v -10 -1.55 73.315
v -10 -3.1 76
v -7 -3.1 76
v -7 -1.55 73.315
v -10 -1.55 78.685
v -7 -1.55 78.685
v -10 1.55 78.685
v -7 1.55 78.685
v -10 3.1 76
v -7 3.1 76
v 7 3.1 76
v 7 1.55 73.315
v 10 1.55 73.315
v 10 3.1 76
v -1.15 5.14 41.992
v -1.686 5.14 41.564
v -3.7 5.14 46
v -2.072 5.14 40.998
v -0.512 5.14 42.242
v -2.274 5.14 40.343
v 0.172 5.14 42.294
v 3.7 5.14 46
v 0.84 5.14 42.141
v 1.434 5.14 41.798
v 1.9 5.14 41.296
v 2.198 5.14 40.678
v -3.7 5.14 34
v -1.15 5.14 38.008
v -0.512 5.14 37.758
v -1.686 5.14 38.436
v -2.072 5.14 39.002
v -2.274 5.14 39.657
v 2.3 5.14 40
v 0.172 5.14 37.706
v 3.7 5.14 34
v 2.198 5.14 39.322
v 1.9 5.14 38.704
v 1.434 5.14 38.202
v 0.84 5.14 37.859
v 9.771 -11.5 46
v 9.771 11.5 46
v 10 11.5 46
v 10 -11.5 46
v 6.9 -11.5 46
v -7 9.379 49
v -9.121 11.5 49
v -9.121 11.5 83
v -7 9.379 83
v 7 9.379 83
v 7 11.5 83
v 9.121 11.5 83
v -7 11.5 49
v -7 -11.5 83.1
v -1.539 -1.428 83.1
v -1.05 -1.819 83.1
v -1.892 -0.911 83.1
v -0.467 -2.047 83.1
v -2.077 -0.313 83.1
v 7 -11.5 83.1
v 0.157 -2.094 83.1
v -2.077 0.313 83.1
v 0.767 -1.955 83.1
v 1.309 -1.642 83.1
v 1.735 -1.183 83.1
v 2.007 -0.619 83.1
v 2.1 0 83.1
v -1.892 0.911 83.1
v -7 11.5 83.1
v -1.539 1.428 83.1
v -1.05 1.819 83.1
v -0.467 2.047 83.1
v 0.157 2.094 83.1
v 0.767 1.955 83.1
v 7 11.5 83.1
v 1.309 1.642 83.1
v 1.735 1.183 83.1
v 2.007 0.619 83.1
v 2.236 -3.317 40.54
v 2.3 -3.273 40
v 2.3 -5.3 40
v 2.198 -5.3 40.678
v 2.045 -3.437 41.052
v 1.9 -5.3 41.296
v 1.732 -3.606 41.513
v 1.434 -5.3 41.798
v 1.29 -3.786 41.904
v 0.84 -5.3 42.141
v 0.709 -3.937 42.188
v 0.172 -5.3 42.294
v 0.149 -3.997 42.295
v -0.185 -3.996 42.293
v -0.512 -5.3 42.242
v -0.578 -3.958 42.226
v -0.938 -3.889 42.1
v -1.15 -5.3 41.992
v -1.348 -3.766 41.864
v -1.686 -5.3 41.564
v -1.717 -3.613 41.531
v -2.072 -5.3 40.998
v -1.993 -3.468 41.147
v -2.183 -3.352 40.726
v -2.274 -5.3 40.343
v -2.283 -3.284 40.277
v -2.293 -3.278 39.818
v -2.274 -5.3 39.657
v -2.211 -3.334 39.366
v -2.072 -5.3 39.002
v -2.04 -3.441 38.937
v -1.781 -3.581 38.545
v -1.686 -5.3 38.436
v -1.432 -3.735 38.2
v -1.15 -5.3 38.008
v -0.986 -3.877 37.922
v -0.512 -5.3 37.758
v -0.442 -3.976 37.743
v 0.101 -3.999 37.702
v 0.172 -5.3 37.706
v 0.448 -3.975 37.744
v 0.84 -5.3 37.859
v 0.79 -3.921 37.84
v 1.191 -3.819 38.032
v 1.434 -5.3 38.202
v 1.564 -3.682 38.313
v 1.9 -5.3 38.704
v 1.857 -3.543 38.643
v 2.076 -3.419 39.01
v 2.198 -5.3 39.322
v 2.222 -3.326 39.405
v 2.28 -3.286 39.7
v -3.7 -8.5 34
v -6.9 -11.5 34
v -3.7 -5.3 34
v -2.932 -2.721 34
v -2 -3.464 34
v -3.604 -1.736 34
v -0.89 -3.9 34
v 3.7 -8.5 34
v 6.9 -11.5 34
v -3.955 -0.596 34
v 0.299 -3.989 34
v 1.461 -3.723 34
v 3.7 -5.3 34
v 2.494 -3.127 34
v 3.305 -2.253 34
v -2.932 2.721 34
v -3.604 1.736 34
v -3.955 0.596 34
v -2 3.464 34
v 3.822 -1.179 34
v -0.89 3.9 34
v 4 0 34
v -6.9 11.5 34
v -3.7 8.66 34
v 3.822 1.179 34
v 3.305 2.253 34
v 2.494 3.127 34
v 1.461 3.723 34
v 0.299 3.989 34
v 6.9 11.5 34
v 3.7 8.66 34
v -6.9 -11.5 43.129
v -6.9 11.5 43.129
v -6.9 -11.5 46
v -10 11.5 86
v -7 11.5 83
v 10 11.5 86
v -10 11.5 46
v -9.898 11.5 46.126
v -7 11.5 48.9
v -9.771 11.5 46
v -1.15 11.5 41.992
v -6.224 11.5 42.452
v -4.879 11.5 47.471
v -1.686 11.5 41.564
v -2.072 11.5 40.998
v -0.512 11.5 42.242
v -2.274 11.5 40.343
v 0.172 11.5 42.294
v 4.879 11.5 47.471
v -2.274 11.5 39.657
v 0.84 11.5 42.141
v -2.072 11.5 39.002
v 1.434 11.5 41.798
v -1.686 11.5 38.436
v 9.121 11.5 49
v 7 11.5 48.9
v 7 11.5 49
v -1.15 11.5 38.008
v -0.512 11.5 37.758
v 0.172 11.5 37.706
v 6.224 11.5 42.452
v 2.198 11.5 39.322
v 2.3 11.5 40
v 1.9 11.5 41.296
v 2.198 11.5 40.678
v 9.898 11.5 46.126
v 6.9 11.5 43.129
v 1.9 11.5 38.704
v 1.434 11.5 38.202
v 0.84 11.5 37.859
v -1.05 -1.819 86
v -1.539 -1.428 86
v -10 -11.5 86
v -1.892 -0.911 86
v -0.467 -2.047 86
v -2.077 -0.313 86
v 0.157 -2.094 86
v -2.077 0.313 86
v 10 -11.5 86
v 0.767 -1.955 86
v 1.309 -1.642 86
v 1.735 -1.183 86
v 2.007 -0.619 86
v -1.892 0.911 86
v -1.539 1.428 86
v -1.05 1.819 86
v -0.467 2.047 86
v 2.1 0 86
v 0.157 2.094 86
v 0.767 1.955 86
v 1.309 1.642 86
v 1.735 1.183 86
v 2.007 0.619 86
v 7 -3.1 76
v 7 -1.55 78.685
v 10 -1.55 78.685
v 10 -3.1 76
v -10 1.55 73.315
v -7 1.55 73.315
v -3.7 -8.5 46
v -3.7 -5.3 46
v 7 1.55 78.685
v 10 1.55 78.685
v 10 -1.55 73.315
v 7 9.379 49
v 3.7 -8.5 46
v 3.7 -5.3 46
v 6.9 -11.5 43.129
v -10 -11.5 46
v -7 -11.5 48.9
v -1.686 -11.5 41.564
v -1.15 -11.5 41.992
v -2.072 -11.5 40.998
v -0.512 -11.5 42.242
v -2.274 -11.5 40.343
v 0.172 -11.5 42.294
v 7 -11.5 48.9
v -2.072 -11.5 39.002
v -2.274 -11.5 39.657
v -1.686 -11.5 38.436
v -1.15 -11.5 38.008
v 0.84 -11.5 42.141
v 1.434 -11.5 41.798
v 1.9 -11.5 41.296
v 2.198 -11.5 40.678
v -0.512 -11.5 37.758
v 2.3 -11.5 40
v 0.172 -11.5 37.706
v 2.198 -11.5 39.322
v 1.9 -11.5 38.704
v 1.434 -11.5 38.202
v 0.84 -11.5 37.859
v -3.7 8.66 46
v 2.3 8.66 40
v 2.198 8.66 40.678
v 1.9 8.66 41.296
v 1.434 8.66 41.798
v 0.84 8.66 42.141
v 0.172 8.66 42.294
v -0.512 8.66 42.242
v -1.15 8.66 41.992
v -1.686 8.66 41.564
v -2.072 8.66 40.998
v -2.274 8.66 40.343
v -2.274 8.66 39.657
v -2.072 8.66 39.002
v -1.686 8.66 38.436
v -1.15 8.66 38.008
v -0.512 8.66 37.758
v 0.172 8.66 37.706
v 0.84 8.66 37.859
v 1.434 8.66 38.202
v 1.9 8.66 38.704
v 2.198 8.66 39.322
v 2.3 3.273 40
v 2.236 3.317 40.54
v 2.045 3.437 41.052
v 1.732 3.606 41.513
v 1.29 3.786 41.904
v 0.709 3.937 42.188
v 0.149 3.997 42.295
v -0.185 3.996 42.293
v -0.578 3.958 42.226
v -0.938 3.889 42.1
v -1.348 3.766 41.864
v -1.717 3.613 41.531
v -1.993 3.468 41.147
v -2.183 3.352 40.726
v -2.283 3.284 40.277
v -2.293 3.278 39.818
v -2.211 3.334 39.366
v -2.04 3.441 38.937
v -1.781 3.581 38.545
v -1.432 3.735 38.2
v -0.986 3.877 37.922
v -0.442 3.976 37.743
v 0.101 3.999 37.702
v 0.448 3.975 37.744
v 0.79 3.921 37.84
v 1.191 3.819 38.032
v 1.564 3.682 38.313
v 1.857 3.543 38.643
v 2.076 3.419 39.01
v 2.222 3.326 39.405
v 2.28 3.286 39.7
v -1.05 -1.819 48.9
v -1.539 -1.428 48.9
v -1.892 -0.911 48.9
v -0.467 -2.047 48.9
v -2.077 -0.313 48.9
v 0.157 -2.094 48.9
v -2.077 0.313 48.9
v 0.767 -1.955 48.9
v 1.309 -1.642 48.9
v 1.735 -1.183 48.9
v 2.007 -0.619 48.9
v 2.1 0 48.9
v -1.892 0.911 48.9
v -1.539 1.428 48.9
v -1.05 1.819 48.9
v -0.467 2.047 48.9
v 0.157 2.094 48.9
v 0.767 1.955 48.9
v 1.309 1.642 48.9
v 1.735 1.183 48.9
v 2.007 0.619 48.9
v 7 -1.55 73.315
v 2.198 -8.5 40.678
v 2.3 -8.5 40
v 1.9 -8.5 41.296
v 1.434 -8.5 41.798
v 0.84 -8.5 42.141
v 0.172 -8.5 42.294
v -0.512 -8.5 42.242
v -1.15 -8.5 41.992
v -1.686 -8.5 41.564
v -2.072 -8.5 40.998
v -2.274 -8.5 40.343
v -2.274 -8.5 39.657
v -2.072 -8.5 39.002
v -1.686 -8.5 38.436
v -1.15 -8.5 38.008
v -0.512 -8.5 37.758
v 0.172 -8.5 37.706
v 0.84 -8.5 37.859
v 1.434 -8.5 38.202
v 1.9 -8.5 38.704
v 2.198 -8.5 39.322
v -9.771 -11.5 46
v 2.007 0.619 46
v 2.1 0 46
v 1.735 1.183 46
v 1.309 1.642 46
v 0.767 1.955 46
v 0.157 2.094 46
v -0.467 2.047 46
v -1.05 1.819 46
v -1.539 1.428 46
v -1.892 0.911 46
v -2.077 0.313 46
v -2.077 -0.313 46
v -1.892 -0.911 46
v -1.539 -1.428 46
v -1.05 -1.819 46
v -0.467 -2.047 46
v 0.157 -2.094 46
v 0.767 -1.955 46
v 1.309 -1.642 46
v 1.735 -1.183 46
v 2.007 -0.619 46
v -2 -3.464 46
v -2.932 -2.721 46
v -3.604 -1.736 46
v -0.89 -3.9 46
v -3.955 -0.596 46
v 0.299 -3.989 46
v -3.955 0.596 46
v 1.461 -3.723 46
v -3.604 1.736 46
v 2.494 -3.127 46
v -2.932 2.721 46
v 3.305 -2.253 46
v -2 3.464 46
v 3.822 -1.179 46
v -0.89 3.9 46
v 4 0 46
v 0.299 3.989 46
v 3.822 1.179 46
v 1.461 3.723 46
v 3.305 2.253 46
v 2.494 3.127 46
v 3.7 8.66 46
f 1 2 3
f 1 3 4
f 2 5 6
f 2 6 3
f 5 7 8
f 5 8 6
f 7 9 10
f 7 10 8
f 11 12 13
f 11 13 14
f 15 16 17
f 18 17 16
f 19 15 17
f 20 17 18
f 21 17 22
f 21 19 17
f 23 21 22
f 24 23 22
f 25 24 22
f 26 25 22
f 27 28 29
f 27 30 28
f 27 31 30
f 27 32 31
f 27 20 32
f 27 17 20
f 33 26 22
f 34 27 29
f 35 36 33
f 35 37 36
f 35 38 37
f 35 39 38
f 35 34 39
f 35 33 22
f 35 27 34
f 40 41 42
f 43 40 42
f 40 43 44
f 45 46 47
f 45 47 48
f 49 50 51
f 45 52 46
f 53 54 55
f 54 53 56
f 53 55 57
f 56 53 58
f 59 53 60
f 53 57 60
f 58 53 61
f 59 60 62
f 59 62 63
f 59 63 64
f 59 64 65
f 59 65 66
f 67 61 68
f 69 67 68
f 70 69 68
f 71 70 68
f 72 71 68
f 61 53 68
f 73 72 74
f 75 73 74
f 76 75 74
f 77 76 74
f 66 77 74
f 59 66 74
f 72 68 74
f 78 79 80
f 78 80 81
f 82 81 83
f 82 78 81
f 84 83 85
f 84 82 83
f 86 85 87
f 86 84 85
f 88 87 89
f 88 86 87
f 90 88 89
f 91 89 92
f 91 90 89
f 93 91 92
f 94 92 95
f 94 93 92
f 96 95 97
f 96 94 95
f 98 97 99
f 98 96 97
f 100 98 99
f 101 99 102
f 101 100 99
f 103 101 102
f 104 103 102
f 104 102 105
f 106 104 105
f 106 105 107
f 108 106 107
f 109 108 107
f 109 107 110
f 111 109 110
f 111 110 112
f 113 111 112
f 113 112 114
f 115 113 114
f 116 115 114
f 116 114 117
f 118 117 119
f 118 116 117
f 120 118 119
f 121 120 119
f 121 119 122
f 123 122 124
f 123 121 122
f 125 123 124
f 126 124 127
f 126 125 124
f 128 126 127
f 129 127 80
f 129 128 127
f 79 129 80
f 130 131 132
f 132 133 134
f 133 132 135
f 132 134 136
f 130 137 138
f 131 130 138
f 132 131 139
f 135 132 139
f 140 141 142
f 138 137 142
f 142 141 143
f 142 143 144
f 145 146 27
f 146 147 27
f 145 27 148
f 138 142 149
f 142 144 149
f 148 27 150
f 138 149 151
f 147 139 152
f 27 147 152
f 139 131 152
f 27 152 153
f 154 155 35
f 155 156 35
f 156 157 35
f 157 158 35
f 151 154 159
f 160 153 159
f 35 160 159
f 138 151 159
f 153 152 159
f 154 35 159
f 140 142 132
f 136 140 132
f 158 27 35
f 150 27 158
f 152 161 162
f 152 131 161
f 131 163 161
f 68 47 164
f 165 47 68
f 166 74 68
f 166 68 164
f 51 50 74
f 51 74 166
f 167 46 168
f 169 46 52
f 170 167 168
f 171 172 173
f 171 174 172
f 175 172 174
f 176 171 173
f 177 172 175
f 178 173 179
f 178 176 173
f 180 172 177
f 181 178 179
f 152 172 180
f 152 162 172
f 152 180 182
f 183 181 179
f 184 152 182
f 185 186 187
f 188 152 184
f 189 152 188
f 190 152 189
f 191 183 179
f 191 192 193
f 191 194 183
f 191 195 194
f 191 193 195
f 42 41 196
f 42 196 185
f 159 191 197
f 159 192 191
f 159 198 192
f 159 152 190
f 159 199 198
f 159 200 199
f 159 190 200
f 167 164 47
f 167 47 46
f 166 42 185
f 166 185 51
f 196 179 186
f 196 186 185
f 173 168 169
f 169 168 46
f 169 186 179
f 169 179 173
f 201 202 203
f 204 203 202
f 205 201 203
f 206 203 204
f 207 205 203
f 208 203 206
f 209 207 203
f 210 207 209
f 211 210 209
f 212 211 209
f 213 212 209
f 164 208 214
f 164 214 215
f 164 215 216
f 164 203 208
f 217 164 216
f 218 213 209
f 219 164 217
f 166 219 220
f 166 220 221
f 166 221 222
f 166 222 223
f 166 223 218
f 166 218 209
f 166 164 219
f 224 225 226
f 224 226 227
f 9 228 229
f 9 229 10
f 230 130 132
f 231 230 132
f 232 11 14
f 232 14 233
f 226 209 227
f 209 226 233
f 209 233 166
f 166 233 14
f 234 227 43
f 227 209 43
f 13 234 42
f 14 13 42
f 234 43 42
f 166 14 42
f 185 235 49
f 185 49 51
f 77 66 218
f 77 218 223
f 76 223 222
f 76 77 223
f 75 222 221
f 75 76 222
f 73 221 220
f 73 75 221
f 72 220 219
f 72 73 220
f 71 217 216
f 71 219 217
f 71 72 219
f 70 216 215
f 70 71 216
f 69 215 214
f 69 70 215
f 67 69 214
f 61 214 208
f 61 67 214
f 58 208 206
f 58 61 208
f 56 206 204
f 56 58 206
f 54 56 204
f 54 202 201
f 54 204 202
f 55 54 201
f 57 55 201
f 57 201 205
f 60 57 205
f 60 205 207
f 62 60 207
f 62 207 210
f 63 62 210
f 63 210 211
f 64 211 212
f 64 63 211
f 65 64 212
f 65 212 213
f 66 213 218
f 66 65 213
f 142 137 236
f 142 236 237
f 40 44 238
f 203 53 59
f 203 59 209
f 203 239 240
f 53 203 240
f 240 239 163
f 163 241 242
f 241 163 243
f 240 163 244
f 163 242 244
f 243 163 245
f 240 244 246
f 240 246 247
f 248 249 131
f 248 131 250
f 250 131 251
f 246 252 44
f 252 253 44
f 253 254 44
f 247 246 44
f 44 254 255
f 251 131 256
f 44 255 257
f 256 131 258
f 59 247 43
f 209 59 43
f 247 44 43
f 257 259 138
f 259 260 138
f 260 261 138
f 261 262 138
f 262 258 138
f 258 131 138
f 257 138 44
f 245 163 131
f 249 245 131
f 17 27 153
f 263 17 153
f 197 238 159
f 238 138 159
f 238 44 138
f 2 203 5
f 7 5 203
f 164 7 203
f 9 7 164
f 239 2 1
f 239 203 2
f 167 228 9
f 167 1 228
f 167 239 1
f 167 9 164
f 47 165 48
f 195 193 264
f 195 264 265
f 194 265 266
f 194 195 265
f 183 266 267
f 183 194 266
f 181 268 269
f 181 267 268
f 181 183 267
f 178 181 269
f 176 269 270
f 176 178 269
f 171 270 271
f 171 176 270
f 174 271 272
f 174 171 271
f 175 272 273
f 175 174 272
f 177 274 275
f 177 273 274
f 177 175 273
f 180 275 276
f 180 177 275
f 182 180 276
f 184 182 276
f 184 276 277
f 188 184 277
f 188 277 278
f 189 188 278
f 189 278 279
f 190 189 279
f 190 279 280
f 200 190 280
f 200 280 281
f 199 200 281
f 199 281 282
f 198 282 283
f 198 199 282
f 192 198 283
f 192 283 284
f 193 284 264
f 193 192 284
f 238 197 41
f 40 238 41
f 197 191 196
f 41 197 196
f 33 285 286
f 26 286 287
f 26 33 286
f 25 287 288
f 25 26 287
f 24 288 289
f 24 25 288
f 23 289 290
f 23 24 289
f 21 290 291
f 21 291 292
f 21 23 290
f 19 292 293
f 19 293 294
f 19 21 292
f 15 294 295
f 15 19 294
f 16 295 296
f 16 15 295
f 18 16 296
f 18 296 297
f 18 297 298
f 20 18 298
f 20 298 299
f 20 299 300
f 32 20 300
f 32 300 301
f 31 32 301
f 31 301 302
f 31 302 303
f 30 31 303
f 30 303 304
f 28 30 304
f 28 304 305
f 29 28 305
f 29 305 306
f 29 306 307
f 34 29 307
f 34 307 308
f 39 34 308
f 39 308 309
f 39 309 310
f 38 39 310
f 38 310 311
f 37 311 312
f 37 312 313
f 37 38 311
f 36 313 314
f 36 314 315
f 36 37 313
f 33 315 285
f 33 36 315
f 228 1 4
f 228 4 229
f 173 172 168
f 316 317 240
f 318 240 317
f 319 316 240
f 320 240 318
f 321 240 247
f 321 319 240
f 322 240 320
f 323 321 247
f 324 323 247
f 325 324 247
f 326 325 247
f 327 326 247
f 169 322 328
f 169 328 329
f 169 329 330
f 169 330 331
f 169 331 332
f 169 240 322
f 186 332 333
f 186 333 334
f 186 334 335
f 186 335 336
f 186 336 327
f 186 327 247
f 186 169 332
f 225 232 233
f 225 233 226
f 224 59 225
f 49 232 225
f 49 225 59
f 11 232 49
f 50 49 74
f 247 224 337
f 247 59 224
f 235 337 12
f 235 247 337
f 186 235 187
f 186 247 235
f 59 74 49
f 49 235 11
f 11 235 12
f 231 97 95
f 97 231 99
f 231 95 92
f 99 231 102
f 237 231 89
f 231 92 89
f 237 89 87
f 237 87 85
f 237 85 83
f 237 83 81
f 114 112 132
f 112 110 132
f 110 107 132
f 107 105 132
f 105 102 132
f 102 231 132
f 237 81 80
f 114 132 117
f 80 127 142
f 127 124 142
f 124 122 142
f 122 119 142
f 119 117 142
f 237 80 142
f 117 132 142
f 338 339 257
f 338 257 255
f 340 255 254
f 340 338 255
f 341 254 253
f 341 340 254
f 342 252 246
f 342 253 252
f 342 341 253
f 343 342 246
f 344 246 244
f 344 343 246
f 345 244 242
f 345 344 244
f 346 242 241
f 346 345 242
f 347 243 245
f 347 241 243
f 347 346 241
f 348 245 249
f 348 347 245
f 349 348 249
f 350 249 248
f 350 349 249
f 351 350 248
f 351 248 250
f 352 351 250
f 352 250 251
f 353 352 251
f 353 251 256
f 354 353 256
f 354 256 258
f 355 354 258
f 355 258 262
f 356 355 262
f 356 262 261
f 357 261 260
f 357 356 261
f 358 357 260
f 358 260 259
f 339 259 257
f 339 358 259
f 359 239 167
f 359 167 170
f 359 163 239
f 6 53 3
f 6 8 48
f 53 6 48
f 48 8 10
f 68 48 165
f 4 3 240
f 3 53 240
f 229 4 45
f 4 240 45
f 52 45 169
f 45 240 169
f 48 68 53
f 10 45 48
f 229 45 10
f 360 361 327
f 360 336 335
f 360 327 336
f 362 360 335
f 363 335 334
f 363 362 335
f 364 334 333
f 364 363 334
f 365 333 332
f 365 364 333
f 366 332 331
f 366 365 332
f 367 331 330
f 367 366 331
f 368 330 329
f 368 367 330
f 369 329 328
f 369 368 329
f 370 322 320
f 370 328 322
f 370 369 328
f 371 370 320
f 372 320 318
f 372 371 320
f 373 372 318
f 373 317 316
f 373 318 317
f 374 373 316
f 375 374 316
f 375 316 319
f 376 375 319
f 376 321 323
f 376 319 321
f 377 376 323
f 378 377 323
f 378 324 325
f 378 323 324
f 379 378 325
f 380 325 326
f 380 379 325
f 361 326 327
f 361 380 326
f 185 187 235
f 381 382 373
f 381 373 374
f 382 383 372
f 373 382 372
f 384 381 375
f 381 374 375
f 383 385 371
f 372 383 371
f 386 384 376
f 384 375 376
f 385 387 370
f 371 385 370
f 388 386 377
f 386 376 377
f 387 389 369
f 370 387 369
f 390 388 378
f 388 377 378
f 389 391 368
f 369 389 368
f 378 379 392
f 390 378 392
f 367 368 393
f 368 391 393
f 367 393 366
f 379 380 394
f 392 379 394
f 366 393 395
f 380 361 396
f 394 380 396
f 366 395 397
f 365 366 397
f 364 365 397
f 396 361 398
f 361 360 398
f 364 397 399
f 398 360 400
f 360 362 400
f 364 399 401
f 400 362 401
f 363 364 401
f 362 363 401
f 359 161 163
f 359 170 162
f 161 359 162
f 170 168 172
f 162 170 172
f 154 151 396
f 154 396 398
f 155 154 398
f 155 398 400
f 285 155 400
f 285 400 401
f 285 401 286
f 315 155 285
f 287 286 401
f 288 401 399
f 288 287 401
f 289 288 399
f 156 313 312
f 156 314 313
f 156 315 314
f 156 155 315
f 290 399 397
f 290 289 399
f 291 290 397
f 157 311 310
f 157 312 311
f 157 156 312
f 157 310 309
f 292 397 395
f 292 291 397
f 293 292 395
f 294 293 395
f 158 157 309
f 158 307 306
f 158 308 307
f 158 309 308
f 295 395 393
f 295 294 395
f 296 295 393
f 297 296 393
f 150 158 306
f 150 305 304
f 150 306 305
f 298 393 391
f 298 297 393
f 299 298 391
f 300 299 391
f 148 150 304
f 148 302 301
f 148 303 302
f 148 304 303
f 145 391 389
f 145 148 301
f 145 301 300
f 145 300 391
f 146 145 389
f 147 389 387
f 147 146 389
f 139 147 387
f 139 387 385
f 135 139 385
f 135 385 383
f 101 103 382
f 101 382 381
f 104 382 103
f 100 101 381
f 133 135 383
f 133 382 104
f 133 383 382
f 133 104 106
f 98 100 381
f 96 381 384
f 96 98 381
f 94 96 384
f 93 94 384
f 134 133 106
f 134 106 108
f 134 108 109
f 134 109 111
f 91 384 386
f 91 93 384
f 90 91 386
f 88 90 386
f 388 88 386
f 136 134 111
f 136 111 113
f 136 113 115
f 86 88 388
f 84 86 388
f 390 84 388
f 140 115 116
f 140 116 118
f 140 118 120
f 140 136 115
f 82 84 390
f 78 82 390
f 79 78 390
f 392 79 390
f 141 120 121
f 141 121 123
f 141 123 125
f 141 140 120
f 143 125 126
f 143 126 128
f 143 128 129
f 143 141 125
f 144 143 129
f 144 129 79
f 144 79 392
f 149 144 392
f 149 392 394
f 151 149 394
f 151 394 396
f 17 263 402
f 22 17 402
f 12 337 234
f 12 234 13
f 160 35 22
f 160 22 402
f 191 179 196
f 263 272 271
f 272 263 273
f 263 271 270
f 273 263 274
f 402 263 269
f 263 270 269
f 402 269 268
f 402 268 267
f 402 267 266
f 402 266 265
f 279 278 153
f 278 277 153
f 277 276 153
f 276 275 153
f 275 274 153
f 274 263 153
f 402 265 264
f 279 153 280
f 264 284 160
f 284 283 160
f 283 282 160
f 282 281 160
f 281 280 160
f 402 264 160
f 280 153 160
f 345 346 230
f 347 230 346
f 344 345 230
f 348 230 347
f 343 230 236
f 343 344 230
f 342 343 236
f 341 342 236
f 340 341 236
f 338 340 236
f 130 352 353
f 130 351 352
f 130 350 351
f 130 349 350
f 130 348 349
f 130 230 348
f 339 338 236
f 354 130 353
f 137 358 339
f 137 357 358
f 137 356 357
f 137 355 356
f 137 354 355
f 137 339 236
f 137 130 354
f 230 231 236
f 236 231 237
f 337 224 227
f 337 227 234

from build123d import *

# Parameters (mm, degrees)
CYLINDER010_R            = 2.1
CYLINDER010_DEPTH        = 43
CYLINDER011_R            = 4
CYLINDER011_DEPTH        = 12
CYLINDER012_R            = 2.3
CYLINDER012_DEPTH        = 71
CUBE018_W                = 7.4
CUBE018_H                = 3.2
CUBE018_DEPTH            = 12
CUBE019_W                = 7.4
CUBE019_H                = 3.52
CUBE019_DEPTH            = 12
PRISM011_DEPTH           = 34
PRISM011_PLACEMENT_ANGLE = 15
PRISM012_DEPTH           = 34
PRISM012_PLACEMENT_ANGLE = 75
PRISM013_DEPTH           = 21
CUBE017_W                = 14
CUBE017_H                = 23
CUBE017_DEPTH            = 34.2
CUBE016_W                = 13.8
CUBE016_H                = 23
CUBE016_DEPTH            = 12
PRISM009_DEPTH           = 23
PRISM009_ROLL_ANGLE      = 90
PRISM009_PITCH_ANGLE     = -14.999996
PRISM010_DEPTH           = 23
PRISM010_ROLL_ANGLE      = -90
PRISM010_PITCH_ANGLE     = -14.999996
PRISM010_PLACEMENT_ANGLE = -180
CUBE015_W                = 20
CUBE015_H                = 23
CUBE015_DEPTH            = 40


with BuildPart() as cylinder010:
    # cylinder010 → cylinder010 (new body)
    with BuildSketch(Plane.XY.offset(44.5)):
        Circle(CYLINDER010_R)
    extrude(amount=CYLINDER010_DEPTH)


with BuildPart() as cylinder011:
    # cylinder011 → cylinder011 (new body)
    with BuildSketch(Plane.XY.offset(34)):
        Circle(CYLINDER011_R)
    extrude(amount=CYLINDER011_DEPTH)


with BuildPart() as cylinder012:
    # cylinder012 → cylinder012 (new body)
    with BuildSketch(Plane(origin=(0, 35.5, 40), x_dir=(1, 0, 0), z_dir=(0, -1, 0))):
        Circle(CYLINDER012_R)
    extrude(amount=CYLINDER012_DEPTH)


with BuildPart() as cube018:
    # cube018 → cube018 (new body)
    with BuildSketch(Plane(origin=(-3.7, -8.5, 34), x_dir=(1, 0, 0), z_dir=(0, 0, 1))):
        with Locations((3.7, 1.6)):
            Rectangle(CUBE018_W, CUBE018_H)
    extrude(amount=CUBE018_DEPTH)


with BuildPart() as cube019:
    # cube019 → cube019 (new body)
    with BuildSketch(Plane(origin=(-3.7, 5.14, 34), x_dir=(1, 0, 0), z_dir=(0, 0, 1))):
        with Locations((3.7, 1.76)):
            Rectangle(CUBE019_W, CUBE019_H)
    extrude(amount=CUBE019_DEPTH)


with BuildPart() as prism011:
    # prism011 → prism011 (new body)
    with BuildSketch(Plane.XY):
        Polygon((3, 0), (-1.5, 2.598076), (-1.5, -2.598076), align=None)
    extrude(amount=PRISM011_DEPTH)


with BuildPart() as prism011_1:
    # prism011 placement: moved
    add(prism011.part.moved(Location((7, 11.5, 49))).rotate(Axis((7, 11.5, 49), (0, 0, 1)), PRISM011_PLACEMENT_ANGLE))


with BuildPart() as prism012:
    # prism012 → prism012 (new body)
    with BuildSketch(Plane.XY):
        Polygon((3, 0), (-1.5, 2.598076), (-1.5, -2.598076), align=None)
    extrude(amount=PRISM012_DEPTH)


with BuildPart() as prism012_1:
    # prism012 placement: moved
    add(prism012.part.moved(Location((-7, 11.5, 49))).rotate(Axis((-7, 11.5, 49), (0, 0, -1)), PRISM012_PLACEMENT_ANGLE))


with BuildPart() as prism013:
    # prism013 → prism013 (new body)
    with BuildSketch(Plane(origin=(-10.5, 0, 76), x_dir=(0, 1, 0), z_dir=(1, 0, 0))):
        Polygon((3.1, 0), (1.55, 2.684679), (-1.55, 2.684679), (-3.1, 0), (-1.55, -2.684679), (1.55, -2.684679), align=None)
    extrude(amount=PRISM013_DEPTH)


with BuildPart() as group007:
    # cube017 → cube017 (new body)
    with BuildSketch(Plane(origin=(-7, -11.5, 48.9), x_dir=(1, 0, 0), z_dir=(0, 0, 1))):
        with Locations((7, 11.5)):
            Rectangle(CUBE017_W, CUBE017_H)
    extrude(amount=CUBE017_DEPTH)

    # Group007: union cylinder010, cylinder011, cylinder012, cube018, cube019, prism011, prism012, prism013
    add(cylinder010.part)
    add(cylinder011.part)
    add(cylinder012.part)
    add(cube018.part)
    add(cube019.part)
    add(prism011_1.part)
    add(prism012_1.part)
    add(prism013.part)


with BuildPart() as cube016:
    # cube016 → cube016 (new body)
    with BuildSketch(Plane(origin=(-6.9, -11.5, 34), x_dir=(1, 0, 0), z_dir=(0, 0, 1))):
        with Locations((6.9, 11.5)):
            Rectangle(CUBE016_W, CUBE016_H)
    extrude(amount=CUBE016_DEPTH)


with BuildPart() as prism009:
    # prism009 → prism009 (new body)
    with BuildSketch(Plane.XY):
        Polygon((3, 0), (-1.5, 2.598076), (-1.5, -2.598076), align=None)
    extrude(amount=PRISM009_DEPTH)


with BuildPart() as prism009_1:
    # prism009 roll: moved
    add(prism009.part.rotate(Axis((0, 0, 0), (1, 0, 0)), PRISM009_ROLL_ANGLE))


with BuildPart() as prism009_2:
    # prism009 pitch: moved
    add(prism009_1.part.rotate(Axis((0, 0, 0), (0, 1, 0)), PRISM009_PITCH_ANGLE))


with BuildPart() as prism009_3:
    # prism009 placement: moved
    add(prism009_2.part.moved(Location((7, 11.500001, 45.35))))


with BuildPart() as prism010:
    # prism010 → prism010 (new body)
    with BuildSketch(Plane.XY):
        Polygon((3, 0), (-1.5, 2.598076), (-1.5, -2.598076), align=None)
    extrude(amount=PRISM010_DEPTH)


with BuildPart() as prism010_1:
    # prism010 roll: moved
    add(prism010.part.rotate(Axis((0, 0, 0), (1, 0, 0)), PRISM010_ROLL_ANGLE))


with BuildPart() as prism010_2:
    # prism010 pitch: moved
    add(prism010_1.part.rotate(Axis((0, 0, 0), (0, 1, 0)), PRISM010_PITCH_ANGLE))


with BuildPart() as prism010_3:
    # prism010 placement: moved
    add(prism010_2.part.moved(Location((-7, 11.500001, 45.35))).rotate(Axis((-7, 11.500001, 45.35), (0, 0, 1)), PRISM010_PLACEMENT_ANGLE))


with BuildPart() as side_slider:
    # cube015 → cube015 (new body)
    with BuildSketch(Plane(origin=(-10, -11.5, 46), x_dir=(1, 0, 0), z_dir=(0, 0, 1))):
        with Locations((10, 11.5)):
            Rectangle(CUBE015_W, CUBE015_H)
    extrude(amount=CUBE015_DEPTH)

    # Group006: union cube016, prism009, prism010
    add(cube016.part)
    add(prism009_3.part)
    add(prism010_3.part)

    # difference004: cut Group007
    add(group007.part, mode=Mode.SUBTRACT)


solid = side_slider.part
